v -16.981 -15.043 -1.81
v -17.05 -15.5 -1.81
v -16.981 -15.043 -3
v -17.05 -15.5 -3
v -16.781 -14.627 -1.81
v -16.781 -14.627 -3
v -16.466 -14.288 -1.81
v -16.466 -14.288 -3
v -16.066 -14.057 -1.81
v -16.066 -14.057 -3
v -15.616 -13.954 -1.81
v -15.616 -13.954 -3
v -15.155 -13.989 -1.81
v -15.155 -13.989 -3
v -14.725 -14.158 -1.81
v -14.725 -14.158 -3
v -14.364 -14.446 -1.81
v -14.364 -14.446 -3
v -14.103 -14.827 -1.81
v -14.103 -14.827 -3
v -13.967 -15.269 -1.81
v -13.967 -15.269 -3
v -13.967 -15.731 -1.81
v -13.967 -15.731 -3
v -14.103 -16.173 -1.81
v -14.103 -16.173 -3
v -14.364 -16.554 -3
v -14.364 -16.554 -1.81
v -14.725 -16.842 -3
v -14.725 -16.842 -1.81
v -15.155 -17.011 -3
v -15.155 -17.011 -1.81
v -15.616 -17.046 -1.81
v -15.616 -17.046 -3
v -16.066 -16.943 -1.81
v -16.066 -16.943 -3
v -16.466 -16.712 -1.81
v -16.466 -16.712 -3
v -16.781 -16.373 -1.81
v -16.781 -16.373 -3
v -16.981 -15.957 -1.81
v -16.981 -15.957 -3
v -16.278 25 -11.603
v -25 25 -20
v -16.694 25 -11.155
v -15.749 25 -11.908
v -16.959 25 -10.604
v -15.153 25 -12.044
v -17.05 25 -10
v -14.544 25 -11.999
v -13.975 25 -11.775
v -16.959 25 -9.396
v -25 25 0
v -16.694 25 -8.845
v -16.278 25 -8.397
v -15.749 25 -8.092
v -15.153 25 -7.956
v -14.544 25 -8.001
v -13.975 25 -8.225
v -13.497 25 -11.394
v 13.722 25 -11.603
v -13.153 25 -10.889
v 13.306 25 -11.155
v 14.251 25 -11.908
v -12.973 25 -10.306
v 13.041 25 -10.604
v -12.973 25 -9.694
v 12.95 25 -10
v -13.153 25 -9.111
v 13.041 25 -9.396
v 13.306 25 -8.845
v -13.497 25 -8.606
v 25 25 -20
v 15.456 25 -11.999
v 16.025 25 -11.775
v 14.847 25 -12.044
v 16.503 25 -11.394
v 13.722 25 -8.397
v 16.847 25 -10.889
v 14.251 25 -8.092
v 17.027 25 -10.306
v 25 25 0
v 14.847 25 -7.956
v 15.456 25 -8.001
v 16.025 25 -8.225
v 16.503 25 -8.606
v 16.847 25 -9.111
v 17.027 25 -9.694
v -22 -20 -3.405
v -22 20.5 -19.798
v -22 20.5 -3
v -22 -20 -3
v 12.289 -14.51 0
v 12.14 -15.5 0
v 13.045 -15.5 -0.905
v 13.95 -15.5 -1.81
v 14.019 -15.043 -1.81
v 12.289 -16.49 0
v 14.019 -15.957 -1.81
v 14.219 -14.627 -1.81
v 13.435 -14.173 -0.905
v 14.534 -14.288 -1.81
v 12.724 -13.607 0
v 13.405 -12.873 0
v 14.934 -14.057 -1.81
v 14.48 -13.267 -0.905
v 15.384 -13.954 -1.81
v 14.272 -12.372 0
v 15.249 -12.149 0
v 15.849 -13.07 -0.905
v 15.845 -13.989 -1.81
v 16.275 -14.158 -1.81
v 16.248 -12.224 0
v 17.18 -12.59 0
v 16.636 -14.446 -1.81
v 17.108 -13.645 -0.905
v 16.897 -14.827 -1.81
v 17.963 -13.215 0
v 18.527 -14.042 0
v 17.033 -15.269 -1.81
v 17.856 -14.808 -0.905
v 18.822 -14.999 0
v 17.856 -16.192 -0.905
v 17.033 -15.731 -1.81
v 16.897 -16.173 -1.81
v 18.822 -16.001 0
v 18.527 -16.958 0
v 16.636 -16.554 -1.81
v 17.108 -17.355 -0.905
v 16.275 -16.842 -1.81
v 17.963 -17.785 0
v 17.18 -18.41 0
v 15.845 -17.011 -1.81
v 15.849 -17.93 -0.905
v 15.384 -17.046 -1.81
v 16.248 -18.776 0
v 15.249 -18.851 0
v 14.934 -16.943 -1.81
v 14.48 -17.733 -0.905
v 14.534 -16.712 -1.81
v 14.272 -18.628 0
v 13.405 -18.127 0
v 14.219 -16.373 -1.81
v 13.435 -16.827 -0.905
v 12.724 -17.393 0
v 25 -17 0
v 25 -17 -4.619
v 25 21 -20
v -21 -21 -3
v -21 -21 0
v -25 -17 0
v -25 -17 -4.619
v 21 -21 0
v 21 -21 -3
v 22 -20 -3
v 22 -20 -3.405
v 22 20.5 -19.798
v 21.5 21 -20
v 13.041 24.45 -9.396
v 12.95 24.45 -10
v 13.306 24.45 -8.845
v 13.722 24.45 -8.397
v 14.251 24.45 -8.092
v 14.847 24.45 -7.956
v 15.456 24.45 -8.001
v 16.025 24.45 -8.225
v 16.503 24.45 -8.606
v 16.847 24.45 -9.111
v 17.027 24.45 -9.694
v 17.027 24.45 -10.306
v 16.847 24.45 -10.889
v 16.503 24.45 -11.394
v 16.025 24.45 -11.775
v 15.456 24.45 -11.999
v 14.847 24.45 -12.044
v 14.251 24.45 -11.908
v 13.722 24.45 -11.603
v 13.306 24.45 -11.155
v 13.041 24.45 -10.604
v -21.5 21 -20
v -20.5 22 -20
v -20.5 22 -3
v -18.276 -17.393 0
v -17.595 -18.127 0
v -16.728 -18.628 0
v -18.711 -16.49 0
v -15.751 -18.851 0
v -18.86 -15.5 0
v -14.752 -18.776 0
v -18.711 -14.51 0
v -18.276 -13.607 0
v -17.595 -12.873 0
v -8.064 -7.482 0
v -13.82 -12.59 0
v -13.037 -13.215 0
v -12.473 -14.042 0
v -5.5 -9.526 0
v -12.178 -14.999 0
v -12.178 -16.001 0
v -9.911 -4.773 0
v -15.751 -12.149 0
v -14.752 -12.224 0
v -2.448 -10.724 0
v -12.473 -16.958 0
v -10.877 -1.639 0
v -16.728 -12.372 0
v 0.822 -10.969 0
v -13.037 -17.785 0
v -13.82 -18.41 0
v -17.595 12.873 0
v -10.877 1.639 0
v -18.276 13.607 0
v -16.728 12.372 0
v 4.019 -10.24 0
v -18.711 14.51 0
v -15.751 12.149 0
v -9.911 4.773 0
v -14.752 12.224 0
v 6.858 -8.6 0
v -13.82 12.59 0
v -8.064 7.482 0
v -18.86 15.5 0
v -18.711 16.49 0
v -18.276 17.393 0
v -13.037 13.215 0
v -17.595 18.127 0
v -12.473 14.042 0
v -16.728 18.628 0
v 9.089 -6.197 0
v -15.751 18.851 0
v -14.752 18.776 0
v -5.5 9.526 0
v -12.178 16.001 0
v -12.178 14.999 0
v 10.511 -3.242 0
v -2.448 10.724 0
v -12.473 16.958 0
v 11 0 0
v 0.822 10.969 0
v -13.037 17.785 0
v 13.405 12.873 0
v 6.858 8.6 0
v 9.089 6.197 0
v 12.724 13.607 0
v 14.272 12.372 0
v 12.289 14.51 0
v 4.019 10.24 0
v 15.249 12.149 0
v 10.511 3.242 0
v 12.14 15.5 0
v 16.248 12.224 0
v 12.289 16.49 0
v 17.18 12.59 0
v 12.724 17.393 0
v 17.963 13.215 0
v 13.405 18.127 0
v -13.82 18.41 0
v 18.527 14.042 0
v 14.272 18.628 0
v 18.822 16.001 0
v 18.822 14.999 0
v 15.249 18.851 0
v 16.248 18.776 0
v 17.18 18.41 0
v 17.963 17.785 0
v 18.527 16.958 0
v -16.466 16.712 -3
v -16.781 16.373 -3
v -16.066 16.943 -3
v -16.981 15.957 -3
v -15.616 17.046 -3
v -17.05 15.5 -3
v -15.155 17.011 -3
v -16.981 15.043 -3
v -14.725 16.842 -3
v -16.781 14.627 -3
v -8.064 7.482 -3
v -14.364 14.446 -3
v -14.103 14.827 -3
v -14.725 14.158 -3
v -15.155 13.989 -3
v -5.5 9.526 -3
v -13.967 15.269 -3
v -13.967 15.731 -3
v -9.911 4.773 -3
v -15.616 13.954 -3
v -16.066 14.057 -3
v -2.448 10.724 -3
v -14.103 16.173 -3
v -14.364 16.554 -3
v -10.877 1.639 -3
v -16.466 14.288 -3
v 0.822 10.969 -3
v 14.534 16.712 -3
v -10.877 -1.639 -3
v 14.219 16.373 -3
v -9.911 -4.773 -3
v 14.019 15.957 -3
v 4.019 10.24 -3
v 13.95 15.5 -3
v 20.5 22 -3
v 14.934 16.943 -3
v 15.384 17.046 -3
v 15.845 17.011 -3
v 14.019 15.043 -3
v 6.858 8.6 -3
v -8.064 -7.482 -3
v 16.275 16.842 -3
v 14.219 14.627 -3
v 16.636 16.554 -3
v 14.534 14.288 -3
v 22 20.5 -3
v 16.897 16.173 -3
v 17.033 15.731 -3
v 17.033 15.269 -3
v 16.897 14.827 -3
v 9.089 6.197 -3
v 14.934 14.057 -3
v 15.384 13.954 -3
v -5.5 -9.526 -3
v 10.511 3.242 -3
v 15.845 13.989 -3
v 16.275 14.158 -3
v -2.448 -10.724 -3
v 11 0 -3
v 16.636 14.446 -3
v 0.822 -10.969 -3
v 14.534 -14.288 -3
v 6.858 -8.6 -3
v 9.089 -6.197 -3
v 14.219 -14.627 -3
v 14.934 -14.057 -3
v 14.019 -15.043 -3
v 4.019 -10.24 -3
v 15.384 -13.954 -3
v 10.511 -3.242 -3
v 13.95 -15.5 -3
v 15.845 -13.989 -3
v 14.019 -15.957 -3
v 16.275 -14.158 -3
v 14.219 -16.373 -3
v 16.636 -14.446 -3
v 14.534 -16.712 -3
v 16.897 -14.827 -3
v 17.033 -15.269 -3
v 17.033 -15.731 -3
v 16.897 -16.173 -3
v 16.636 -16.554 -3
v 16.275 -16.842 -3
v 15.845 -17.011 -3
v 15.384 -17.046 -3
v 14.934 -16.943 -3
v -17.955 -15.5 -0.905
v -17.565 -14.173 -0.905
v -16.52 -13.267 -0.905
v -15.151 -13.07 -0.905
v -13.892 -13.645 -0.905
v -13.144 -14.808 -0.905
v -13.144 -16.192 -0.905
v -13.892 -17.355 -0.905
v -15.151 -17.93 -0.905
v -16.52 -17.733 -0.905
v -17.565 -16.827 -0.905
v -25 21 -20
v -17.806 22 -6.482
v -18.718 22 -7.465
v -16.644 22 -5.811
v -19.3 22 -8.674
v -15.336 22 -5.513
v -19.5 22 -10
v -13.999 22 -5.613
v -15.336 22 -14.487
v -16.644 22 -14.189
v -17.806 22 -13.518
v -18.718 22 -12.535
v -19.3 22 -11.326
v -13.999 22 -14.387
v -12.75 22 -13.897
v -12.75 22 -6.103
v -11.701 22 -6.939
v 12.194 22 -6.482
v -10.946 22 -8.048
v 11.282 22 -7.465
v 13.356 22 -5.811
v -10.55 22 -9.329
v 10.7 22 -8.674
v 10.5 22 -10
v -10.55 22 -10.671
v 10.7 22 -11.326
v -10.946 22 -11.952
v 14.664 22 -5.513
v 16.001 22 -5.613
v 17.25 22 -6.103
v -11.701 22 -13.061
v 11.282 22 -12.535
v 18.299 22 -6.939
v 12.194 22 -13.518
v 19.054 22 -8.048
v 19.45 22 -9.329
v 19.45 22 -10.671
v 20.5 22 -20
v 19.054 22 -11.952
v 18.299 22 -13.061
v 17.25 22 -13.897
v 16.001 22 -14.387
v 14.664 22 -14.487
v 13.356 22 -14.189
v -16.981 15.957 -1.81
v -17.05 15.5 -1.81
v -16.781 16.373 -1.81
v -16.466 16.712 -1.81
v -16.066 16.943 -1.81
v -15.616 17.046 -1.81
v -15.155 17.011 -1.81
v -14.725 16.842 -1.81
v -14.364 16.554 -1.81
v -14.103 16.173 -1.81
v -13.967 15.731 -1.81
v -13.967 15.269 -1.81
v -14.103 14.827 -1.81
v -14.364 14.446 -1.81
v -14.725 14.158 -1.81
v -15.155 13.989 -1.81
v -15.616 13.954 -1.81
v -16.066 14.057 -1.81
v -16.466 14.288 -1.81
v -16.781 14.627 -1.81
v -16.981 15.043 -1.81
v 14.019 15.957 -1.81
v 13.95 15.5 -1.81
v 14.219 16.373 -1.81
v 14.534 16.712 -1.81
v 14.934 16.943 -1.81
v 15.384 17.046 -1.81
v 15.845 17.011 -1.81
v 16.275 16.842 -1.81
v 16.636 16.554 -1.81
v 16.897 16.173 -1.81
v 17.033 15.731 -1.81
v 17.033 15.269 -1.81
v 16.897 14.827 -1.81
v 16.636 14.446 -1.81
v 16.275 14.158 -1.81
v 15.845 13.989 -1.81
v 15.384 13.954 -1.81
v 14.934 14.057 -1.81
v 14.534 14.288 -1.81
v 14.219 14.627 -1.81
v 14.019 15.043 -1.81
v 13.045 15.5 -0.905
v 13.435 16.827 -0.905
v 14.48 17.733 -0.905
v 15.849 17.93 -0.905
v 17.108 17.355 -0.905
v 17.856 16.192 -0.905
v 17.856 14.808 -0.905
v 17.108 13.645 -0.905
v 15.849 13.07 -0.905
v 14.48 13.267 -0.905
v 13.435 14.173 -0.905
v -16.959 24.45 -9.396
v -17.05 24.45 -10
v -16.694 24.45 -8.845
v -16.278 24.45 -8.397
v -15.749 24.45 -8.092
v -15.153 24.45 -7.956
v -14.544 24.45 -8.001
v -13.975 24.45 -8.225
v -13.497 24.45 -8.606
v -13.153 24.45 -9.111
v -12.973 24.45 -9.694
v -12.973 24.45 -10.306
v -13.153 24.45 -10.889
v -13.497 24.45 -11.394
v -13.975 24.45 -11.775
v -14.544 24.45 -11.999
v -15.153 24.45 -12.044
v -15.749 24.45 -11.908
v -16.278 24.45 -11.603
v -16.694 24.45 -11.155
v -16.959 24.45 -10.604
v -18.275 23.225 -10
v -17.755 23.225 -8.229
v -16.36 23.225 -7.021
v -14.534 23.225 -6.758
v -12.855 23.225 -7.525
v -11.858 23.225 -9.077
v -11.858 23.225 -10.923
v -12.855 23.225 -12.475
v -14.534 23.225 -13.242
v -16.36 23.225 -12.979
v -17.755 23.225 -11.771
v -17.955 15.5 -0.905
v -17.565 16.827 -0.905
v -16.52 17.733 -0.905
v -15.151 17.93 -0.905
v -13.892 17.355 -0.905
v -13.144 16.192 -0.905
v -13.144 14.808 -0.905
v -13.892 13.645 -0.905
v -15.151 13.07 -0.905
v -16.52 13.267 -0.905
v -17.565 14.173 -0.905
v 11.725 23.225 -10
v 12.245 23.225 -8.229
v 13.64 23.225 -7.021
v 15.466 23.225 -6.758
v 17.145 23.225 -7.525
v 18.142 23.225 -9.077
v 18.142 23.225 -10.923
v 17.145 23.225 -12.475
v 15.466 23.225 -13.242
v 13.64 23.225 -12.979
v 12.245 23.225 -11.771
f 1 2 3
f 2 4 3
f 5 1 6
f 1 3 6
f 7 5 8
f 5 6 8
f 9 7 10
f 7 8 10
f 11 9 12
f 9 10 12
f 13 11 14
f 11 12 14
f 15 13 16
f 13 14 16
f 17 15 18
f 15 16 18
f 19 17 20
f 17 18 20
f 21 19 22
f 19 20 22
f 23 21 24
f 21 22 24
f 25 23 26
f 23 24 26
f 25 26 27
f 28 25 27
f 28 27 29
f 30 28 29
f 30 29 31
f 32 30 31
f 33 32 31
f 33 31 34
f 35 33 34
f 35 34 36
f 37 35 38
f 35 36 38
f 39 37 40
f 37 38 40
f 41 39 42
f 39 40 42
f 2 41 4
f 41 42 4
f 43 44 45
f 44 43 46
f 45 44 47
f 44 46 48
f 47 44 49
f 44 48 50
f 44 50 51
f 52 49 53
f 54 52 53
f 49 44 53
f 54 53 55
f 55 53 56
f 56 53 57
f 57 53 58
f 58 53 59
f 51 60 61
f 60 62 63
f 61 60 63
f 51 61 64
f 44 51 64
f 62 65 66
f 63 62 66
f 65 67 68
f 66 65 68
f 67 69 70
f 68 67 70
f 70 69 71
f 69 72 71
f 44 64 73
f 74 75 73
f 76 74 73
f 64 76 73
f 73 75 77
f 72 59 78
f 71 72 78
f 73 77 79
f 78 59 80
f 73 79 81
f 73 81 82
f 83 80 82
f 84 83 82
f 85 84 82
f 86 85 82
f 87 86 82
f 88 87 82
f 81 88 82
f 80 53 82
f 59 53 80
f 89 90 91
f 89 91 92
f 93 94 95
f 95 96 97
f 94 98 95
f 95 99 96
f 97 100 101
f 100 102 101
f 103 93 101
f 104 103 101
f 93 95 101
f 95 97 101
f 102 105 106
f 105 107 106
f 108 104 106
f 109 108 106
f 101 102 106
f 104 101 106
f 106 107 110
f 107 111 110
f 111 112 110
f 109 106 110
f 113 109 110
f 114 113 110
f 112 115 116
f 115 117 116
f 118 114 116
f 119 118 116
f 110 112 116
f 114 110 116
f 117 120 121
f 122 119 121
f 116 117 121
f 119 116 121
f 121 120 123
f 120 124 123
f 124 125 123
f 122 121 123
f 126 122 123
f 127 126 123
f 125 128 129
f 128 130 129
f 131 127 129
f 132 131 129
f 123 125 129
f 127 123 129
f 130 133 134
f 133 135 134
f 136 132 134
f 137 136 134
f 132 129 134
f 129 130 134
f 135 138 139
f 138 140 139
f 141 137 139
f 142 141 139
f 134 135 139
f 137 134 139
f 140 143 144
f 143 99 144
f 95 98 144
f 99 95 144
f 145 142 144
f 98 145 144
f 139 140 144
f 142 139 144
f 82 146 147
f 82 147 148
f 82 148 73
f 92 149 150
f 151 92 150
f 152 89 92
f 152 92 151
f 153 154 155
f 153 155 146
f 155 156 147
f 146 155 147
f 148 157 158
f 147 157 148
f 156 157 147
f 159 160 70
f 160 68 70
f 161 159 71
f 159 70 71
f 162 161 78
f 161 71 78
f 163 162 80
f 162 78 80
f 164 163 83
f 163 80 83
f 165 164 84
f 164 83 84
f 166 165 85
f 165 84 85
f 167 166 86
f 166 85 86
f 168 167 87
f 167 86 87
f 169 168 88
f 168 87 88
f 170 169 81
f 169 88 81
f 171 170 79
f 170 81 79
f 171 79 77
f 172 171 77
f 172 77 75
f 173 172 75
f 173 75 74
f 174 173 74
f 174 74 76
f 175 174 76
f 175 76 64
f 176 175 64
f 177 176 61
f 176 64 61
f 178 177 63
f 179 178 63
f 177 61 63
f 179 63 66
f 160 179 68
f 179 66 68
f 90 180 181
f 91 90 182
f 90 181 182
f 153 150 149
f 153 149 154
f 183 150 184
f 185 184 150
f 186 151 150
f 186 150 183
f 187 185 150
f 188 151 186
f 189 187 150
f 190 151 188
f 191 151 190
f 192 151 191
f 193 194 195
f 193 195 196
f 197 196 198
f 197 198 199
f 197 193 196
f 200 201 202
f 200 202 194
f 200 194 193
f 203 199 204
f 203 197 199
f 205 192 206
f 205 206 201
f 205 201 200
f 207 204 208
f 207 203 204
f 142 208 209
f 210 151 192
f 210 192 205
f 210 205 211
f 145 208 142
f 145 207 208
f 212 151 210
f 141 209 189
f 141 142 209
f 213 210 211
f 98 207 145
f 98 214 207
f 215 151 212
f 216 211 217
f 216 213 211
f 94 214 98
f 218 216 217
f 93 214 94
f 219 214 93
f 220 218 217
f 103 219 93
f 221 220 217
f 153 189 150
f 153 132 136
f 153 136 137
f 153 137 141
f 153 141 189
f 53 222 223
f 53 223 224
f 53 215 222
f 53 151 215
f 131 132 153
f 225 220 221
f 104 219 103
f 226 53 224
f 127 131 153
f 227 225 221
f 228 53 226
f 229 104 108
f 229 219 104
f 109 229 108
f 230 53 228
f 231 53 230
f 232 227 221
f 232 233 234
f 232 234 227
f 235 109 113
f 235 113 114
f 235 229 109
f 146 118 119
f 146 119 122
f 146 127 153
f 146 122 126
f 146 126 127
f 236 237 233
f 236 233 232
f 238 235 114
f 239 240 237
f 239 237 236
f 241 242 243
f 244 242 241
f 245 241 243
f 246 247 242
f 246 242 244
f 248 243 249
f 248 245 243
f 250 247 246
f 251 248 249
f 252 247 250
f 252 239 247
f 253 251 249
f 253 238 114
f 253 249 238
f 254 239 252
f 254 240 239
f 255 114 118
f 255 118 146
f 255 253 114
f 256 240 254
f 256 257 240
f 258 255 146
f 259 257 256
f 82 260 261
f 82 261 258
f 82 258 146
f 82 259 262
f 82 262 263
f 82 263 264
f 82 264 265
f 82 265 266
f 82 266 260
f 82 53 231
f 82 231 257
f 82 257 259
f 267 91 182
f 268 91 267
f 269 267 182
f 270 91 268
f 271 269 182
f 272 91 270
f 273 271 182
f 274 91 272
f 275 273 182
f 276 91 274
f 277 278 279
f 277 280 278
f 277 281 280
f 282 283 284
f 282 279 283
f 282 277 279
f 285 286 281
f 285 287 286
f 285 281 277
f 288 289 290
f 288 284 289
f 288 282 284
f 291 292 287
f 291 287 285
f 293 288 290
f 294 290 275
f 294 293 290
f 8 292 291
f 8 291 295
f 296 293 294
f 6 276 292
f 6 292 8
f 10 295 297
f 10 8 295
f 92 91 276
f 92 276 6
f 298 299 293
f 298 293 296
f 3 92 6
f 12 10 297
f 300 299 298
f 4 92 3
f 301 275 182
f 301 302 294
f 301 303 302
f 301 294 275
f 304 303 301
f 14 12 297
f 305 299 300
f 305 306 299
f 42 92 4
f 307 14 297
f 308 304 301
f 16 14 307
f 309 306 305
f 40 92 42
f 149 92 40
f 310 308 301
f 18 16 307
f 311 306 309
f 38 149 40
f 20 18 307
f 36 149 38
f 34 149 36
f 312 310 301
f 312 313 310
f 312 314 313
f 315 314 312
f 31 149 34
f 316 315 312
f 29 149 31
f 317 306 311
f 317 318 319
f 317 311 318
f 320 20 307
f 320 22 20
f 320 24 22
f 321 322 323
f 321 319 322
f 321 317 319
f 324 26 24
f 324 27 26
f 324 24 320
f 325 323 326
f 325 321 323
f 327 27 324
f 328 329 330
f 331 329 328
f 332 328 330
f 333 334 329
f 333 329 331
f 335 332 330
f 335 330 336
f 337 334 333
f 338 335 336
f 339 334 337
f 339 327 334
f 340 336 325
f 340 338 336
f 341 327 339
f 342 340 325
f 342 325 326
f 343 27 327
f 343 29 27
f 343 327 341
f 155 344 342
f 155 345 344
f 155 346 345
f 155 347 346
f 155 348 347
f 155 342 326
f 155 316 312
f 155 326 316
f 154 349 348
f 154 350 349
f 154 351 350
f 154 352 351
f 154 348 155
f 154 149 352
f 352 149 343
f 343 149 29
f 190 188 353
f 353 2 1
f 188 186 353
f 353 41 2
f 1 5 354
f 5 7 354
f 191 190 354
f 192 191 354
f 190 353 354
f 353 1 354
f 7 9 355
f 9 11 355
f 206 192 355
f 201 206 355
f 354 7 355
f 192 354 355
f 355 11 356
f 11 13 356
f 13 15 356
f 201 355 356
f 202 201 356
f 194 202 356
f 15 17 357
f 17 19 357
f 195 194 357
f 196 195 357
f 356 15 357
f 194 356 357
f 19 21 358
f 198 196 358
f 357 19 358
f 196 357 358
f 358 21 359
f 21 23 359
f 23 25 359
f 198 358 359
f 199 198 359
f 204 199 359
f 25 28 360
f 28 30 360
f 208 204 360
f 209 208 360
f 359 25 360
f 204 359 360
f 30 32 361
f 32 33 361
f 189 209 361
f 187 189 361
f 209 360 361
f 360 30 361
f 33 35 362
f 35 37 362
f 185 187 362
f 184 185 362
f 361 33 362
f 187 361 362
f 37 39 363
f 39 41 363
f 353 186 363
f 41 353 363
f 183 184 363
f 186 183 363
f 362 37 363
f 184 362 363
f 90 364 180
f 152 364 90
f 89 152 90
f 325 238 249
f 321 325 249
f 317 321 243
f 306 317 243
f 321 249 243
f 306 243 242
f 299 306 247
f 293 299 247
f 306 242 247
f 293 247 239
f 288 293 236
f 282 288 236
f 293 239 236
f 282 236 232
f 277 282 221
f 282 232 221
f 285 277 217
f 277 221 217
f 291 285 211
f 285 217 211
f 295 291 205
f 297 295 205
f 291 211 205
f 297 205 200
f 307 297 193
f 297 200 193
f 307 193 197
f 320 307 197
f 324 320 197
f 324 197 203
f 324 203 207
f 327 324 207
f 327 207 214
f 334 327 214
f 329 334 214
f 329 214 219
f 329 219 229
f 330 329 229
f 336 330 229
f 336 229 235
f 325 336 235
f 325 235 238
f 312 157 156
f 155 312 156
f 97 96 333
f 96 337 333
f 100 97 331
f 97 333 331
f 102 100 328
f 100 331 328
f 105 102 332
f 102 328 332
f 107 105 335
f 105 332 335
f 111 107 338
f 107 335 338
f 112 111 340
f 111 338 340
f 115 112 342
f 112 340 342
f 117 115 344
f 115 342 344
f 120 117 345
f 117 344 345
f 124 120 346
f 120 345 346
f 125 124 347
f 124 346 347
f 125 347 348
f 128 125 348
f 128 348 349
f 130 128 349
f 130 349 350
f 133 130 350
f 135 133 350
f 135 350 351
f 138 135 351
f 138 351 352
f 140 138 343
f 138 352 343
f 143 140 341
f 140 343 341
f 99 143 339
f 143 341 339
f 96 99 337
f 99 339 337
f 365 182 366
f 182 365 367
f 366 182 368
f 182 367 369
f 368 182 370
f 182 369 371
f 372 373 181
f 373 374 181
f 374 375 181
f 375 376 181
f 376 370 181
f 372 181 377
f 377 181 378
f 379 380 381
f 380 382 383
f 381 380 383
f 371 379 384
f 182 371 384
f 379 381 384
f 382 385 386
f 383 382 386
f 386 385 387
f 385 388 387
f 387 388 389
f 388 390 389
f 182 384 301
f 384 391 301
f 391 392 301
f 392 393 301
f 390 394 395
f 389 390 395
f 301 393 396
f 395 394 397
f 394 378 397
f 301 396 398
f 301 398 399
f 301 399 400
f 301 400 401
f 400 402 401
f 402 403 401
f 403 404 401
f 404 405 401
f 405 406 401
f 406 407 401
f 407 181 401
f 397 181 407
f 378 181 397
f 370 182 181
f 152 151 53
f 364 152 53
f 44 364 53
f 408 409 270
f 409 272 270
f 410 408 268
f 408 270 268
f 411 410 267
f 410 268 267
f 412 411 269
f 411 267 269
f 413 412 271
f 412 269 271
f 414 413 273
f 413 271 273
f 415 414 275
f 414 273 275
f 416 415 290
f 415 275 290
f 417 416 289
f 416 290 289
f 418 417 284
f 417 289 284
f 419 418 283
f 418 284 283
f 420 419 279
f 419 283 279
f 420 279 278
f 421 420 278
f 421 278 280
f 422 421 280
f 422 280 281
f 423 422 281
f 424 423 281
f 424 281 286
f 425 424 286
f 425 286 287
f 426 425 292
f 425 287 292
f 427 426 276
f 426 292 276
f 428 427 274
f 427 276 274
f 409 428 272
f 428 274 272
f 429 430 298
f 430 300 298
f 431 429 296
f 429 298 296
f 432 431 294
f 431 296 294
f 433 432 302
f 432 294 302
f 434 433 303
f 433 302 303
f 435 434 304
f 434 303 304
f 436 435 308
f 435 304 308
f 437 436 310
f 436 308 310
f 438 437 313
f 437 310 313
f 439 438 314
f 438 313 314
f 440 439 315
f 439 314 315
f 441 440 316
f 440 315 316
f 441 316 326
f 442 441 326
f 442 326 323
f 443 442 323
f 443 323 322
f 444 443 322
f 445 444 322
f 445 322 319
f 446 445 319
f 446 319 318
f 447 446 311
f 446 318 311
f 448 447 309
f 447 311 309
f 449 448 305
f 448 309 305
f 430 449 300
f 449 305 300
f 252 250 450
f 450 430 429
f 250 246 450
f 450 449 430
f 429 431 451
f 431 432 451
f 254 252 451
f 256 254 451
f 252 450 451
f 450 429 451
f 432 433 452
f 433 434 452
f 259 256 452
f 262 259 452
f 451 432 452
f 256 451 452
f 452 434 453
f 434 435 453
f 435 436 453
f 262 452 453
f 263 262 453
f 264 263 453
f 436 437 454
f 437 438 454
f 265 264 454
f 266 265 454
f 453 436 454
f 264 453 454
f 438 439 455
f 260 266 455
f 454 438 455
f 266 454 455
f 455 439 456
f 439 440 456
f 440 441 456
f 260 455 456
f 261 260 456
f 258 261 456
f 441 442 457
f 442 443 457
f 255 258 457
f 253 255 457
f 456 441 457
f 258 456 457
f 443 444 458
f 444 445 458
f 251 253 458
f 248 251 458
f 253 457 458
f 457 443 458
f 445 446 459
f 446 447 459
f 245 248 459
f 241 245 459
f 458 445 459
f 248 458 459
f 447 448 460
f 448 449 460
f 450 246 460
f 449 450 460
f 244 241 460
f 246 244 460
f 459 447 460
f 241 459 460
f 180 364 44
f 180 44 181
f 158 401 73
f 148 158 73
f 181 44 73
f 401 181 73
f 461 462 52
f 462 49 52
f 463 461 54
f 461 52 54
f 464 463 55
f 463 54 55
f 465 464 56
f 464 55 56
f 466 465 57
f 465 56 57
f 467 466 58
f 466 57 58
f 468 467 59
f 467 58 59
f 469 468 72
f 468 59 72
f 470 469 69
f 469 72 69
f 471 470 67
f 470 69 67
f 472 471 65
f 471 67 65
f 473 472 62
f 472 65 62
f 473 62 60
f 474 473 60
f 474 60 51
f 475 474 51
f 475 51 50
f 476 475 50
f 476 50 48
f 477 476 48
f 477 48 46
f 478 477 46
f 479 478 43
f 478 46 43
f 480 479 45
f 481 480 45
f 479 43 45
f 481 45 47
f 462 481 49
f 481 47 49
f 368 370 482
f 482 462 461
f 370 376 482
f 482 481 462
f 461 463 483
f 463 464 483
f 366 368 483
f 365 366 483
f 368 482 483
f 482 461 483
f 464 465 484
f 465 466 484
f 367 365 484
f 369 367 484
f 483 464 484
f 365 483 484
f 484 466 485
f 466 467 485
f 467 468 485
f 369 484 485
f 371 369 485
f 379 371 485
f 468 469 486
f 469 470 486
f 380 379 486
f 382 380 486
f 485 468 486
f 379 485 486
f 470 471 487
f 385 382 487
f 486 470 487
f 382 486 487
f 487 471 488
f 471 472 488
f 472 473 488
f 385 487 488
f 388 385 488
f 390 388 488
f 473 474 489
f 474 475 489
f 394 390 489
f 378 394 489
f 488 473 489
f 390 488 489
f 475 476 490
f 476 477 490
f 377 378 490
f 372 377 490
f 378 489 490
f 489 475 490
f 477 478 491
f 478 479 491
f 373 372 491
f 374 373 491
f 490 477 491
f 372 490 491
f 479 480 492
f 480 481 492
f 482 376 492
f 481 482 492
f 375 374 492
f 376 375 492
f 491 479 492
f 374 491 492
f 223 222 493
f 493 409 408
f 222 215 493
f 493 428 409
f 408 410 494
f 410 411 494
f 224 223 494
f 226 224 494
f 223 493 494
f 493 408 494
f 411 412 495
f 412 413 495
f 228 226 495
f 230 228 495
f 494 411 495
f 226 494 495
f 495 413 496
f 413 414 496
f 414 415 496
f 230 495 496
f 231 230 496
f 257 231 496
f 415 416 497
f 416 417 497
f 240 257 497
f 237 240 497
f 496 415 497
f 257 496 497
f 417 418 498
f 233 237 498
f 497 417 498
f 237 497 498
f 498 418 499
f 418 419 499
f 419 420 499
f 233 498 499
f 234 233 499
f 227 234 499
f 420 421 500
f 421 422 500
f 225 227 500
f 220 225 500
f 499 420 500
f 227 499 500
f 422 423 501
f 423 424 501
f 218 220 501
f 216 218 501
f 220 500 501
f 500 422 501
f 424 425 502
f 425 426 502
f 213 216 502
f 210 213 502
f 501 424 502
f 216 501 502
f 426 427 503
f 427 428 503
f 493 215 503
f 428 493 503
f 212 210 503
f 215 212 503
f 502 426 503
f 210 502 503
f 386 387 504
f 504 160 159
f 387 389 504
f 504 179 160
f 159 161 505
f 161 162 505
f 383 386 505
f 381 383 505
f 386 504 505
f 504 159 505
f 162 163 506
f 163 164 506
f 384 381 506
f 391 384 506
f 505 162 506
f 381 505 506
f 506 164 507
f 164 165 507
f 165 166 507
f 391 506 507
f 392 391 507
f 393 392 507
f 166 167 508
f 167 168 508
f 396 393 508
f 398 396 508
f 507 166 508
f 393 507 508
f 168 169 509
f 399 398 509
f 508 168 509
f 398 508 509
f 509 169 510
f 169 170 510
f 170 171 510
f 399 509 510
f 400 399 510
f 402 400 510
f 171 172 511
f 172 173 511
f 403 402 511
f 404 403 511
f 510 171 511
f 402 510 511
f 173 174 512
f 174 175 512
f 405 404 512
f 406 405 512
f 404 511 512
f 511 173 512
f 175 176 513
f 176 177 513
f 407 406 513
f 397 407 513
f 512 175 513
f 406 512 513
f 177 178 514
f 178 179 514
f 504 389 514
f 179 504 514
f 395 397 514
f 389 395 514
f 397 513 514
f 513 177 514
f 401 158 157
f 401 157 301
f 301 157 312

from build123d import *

# Parameters (mm, degrees)
F0_W           = 50
F0_H           = 46
F0_R           = 11
F1_DEPTH       = 20
F2_W           = 44
F2_H           = 43
F3_DEPTH       = 17
F4_SIZE2       = 17
F4_SIZE        = 42
F5_D           = 3.1
F5_CSINK_D     = 6.72
F5_CSINK_ANGLE = 90
F6_T1_DEPTH    = 23.5734639037
F7_SIZE        = 1.5
F9_D           = 4.1
F9_CSINK_D     = 9
F9_CSINK_ANGLE = 90


# Not quite as in the source:
# - a fillet or chamfer that OpenCascade refuses, or shapes differently, is made with other operations: its cross-section is extruded or revolved along the edge and cut away or added


with BuildPart() as f1:
    # F0 (on Top) → F1 (new body)
    with BuildSketch(Plane.XY):
        with Locations((0, 2)):
            Rectangle(F0_W, F0_H)
        Circle(F0_R, mode=Mode.SUBTRACT)
    extrude(amount=-F1_DEPTH)

    # F2 (on face) → F3 (cut, through all)
    with BuildSketch(Plane(origin=(0, 0, -20), x_dir=(1, 0, 0), z_dir=(0, 0, -1))):
        with Locations((0, -0.5)):
            Rectangle(F2_W, F2_H)
    extrude(amount=-F3_DEPTH, mode=Mode.SUBTRACT)

    # F4
    f4_edges = [f1.edges().sort_by_distance(p)[0] for p in [
        (23.5, -21, -20),
        (-23.5, -21, -20),
    ]]
    f4_side = f1.faces().sort_by_distance((-24.320588, 2, -20))[0]
    chamfer(f4_edges, length=F4_SIZE, length2=F4_SIZE2, reference=f4_side)

    # F5 (through all)
    with Locations(Plane.XY):
        with Locations((15.5, 15.5), (-15.5, 15.5), (-15.5, -15.5), (15.5, -15.5)):
            CounterSinkHole(F5_D / 2, F5_CSINK_D / 2, counter_sink_angle=F5_CSINK_ANGLE)

    # F6: chamfer of 4 on 2 edges, made by hand

    # F6_s2 → F6_t1 (cut)
    with BuildSketch(Plane.XY.offset(-13.2867319519)):
        Polygon((-21, -21), (-25, -17), (-25, -21), align=None)
        Polygon((21, -21), (25, -17), (25, -21), align=None)
    extrude(amount=F6_T1_DEPTH, mode=Mode.SUBTRACT)

    # F7
    f7_edges = [f1.edges().sort_by_distance(p)[0] for p in [
        (-22, 22, -11.5),
        (22, 22, -11.5),
    ]]
    chamfer(f7_edges, length=F7_SIZE)

    # F9 (through all)
    with Locations(Plane.XZ.offset(-22)):
        with Locations((15, -10), (-15, -10)):
            CounterSinkHole(F9_D / 2, F9_CSINK_D / 2, counter_sink_angle=F9_CSINK_ANGLE)


solid = f1.part
